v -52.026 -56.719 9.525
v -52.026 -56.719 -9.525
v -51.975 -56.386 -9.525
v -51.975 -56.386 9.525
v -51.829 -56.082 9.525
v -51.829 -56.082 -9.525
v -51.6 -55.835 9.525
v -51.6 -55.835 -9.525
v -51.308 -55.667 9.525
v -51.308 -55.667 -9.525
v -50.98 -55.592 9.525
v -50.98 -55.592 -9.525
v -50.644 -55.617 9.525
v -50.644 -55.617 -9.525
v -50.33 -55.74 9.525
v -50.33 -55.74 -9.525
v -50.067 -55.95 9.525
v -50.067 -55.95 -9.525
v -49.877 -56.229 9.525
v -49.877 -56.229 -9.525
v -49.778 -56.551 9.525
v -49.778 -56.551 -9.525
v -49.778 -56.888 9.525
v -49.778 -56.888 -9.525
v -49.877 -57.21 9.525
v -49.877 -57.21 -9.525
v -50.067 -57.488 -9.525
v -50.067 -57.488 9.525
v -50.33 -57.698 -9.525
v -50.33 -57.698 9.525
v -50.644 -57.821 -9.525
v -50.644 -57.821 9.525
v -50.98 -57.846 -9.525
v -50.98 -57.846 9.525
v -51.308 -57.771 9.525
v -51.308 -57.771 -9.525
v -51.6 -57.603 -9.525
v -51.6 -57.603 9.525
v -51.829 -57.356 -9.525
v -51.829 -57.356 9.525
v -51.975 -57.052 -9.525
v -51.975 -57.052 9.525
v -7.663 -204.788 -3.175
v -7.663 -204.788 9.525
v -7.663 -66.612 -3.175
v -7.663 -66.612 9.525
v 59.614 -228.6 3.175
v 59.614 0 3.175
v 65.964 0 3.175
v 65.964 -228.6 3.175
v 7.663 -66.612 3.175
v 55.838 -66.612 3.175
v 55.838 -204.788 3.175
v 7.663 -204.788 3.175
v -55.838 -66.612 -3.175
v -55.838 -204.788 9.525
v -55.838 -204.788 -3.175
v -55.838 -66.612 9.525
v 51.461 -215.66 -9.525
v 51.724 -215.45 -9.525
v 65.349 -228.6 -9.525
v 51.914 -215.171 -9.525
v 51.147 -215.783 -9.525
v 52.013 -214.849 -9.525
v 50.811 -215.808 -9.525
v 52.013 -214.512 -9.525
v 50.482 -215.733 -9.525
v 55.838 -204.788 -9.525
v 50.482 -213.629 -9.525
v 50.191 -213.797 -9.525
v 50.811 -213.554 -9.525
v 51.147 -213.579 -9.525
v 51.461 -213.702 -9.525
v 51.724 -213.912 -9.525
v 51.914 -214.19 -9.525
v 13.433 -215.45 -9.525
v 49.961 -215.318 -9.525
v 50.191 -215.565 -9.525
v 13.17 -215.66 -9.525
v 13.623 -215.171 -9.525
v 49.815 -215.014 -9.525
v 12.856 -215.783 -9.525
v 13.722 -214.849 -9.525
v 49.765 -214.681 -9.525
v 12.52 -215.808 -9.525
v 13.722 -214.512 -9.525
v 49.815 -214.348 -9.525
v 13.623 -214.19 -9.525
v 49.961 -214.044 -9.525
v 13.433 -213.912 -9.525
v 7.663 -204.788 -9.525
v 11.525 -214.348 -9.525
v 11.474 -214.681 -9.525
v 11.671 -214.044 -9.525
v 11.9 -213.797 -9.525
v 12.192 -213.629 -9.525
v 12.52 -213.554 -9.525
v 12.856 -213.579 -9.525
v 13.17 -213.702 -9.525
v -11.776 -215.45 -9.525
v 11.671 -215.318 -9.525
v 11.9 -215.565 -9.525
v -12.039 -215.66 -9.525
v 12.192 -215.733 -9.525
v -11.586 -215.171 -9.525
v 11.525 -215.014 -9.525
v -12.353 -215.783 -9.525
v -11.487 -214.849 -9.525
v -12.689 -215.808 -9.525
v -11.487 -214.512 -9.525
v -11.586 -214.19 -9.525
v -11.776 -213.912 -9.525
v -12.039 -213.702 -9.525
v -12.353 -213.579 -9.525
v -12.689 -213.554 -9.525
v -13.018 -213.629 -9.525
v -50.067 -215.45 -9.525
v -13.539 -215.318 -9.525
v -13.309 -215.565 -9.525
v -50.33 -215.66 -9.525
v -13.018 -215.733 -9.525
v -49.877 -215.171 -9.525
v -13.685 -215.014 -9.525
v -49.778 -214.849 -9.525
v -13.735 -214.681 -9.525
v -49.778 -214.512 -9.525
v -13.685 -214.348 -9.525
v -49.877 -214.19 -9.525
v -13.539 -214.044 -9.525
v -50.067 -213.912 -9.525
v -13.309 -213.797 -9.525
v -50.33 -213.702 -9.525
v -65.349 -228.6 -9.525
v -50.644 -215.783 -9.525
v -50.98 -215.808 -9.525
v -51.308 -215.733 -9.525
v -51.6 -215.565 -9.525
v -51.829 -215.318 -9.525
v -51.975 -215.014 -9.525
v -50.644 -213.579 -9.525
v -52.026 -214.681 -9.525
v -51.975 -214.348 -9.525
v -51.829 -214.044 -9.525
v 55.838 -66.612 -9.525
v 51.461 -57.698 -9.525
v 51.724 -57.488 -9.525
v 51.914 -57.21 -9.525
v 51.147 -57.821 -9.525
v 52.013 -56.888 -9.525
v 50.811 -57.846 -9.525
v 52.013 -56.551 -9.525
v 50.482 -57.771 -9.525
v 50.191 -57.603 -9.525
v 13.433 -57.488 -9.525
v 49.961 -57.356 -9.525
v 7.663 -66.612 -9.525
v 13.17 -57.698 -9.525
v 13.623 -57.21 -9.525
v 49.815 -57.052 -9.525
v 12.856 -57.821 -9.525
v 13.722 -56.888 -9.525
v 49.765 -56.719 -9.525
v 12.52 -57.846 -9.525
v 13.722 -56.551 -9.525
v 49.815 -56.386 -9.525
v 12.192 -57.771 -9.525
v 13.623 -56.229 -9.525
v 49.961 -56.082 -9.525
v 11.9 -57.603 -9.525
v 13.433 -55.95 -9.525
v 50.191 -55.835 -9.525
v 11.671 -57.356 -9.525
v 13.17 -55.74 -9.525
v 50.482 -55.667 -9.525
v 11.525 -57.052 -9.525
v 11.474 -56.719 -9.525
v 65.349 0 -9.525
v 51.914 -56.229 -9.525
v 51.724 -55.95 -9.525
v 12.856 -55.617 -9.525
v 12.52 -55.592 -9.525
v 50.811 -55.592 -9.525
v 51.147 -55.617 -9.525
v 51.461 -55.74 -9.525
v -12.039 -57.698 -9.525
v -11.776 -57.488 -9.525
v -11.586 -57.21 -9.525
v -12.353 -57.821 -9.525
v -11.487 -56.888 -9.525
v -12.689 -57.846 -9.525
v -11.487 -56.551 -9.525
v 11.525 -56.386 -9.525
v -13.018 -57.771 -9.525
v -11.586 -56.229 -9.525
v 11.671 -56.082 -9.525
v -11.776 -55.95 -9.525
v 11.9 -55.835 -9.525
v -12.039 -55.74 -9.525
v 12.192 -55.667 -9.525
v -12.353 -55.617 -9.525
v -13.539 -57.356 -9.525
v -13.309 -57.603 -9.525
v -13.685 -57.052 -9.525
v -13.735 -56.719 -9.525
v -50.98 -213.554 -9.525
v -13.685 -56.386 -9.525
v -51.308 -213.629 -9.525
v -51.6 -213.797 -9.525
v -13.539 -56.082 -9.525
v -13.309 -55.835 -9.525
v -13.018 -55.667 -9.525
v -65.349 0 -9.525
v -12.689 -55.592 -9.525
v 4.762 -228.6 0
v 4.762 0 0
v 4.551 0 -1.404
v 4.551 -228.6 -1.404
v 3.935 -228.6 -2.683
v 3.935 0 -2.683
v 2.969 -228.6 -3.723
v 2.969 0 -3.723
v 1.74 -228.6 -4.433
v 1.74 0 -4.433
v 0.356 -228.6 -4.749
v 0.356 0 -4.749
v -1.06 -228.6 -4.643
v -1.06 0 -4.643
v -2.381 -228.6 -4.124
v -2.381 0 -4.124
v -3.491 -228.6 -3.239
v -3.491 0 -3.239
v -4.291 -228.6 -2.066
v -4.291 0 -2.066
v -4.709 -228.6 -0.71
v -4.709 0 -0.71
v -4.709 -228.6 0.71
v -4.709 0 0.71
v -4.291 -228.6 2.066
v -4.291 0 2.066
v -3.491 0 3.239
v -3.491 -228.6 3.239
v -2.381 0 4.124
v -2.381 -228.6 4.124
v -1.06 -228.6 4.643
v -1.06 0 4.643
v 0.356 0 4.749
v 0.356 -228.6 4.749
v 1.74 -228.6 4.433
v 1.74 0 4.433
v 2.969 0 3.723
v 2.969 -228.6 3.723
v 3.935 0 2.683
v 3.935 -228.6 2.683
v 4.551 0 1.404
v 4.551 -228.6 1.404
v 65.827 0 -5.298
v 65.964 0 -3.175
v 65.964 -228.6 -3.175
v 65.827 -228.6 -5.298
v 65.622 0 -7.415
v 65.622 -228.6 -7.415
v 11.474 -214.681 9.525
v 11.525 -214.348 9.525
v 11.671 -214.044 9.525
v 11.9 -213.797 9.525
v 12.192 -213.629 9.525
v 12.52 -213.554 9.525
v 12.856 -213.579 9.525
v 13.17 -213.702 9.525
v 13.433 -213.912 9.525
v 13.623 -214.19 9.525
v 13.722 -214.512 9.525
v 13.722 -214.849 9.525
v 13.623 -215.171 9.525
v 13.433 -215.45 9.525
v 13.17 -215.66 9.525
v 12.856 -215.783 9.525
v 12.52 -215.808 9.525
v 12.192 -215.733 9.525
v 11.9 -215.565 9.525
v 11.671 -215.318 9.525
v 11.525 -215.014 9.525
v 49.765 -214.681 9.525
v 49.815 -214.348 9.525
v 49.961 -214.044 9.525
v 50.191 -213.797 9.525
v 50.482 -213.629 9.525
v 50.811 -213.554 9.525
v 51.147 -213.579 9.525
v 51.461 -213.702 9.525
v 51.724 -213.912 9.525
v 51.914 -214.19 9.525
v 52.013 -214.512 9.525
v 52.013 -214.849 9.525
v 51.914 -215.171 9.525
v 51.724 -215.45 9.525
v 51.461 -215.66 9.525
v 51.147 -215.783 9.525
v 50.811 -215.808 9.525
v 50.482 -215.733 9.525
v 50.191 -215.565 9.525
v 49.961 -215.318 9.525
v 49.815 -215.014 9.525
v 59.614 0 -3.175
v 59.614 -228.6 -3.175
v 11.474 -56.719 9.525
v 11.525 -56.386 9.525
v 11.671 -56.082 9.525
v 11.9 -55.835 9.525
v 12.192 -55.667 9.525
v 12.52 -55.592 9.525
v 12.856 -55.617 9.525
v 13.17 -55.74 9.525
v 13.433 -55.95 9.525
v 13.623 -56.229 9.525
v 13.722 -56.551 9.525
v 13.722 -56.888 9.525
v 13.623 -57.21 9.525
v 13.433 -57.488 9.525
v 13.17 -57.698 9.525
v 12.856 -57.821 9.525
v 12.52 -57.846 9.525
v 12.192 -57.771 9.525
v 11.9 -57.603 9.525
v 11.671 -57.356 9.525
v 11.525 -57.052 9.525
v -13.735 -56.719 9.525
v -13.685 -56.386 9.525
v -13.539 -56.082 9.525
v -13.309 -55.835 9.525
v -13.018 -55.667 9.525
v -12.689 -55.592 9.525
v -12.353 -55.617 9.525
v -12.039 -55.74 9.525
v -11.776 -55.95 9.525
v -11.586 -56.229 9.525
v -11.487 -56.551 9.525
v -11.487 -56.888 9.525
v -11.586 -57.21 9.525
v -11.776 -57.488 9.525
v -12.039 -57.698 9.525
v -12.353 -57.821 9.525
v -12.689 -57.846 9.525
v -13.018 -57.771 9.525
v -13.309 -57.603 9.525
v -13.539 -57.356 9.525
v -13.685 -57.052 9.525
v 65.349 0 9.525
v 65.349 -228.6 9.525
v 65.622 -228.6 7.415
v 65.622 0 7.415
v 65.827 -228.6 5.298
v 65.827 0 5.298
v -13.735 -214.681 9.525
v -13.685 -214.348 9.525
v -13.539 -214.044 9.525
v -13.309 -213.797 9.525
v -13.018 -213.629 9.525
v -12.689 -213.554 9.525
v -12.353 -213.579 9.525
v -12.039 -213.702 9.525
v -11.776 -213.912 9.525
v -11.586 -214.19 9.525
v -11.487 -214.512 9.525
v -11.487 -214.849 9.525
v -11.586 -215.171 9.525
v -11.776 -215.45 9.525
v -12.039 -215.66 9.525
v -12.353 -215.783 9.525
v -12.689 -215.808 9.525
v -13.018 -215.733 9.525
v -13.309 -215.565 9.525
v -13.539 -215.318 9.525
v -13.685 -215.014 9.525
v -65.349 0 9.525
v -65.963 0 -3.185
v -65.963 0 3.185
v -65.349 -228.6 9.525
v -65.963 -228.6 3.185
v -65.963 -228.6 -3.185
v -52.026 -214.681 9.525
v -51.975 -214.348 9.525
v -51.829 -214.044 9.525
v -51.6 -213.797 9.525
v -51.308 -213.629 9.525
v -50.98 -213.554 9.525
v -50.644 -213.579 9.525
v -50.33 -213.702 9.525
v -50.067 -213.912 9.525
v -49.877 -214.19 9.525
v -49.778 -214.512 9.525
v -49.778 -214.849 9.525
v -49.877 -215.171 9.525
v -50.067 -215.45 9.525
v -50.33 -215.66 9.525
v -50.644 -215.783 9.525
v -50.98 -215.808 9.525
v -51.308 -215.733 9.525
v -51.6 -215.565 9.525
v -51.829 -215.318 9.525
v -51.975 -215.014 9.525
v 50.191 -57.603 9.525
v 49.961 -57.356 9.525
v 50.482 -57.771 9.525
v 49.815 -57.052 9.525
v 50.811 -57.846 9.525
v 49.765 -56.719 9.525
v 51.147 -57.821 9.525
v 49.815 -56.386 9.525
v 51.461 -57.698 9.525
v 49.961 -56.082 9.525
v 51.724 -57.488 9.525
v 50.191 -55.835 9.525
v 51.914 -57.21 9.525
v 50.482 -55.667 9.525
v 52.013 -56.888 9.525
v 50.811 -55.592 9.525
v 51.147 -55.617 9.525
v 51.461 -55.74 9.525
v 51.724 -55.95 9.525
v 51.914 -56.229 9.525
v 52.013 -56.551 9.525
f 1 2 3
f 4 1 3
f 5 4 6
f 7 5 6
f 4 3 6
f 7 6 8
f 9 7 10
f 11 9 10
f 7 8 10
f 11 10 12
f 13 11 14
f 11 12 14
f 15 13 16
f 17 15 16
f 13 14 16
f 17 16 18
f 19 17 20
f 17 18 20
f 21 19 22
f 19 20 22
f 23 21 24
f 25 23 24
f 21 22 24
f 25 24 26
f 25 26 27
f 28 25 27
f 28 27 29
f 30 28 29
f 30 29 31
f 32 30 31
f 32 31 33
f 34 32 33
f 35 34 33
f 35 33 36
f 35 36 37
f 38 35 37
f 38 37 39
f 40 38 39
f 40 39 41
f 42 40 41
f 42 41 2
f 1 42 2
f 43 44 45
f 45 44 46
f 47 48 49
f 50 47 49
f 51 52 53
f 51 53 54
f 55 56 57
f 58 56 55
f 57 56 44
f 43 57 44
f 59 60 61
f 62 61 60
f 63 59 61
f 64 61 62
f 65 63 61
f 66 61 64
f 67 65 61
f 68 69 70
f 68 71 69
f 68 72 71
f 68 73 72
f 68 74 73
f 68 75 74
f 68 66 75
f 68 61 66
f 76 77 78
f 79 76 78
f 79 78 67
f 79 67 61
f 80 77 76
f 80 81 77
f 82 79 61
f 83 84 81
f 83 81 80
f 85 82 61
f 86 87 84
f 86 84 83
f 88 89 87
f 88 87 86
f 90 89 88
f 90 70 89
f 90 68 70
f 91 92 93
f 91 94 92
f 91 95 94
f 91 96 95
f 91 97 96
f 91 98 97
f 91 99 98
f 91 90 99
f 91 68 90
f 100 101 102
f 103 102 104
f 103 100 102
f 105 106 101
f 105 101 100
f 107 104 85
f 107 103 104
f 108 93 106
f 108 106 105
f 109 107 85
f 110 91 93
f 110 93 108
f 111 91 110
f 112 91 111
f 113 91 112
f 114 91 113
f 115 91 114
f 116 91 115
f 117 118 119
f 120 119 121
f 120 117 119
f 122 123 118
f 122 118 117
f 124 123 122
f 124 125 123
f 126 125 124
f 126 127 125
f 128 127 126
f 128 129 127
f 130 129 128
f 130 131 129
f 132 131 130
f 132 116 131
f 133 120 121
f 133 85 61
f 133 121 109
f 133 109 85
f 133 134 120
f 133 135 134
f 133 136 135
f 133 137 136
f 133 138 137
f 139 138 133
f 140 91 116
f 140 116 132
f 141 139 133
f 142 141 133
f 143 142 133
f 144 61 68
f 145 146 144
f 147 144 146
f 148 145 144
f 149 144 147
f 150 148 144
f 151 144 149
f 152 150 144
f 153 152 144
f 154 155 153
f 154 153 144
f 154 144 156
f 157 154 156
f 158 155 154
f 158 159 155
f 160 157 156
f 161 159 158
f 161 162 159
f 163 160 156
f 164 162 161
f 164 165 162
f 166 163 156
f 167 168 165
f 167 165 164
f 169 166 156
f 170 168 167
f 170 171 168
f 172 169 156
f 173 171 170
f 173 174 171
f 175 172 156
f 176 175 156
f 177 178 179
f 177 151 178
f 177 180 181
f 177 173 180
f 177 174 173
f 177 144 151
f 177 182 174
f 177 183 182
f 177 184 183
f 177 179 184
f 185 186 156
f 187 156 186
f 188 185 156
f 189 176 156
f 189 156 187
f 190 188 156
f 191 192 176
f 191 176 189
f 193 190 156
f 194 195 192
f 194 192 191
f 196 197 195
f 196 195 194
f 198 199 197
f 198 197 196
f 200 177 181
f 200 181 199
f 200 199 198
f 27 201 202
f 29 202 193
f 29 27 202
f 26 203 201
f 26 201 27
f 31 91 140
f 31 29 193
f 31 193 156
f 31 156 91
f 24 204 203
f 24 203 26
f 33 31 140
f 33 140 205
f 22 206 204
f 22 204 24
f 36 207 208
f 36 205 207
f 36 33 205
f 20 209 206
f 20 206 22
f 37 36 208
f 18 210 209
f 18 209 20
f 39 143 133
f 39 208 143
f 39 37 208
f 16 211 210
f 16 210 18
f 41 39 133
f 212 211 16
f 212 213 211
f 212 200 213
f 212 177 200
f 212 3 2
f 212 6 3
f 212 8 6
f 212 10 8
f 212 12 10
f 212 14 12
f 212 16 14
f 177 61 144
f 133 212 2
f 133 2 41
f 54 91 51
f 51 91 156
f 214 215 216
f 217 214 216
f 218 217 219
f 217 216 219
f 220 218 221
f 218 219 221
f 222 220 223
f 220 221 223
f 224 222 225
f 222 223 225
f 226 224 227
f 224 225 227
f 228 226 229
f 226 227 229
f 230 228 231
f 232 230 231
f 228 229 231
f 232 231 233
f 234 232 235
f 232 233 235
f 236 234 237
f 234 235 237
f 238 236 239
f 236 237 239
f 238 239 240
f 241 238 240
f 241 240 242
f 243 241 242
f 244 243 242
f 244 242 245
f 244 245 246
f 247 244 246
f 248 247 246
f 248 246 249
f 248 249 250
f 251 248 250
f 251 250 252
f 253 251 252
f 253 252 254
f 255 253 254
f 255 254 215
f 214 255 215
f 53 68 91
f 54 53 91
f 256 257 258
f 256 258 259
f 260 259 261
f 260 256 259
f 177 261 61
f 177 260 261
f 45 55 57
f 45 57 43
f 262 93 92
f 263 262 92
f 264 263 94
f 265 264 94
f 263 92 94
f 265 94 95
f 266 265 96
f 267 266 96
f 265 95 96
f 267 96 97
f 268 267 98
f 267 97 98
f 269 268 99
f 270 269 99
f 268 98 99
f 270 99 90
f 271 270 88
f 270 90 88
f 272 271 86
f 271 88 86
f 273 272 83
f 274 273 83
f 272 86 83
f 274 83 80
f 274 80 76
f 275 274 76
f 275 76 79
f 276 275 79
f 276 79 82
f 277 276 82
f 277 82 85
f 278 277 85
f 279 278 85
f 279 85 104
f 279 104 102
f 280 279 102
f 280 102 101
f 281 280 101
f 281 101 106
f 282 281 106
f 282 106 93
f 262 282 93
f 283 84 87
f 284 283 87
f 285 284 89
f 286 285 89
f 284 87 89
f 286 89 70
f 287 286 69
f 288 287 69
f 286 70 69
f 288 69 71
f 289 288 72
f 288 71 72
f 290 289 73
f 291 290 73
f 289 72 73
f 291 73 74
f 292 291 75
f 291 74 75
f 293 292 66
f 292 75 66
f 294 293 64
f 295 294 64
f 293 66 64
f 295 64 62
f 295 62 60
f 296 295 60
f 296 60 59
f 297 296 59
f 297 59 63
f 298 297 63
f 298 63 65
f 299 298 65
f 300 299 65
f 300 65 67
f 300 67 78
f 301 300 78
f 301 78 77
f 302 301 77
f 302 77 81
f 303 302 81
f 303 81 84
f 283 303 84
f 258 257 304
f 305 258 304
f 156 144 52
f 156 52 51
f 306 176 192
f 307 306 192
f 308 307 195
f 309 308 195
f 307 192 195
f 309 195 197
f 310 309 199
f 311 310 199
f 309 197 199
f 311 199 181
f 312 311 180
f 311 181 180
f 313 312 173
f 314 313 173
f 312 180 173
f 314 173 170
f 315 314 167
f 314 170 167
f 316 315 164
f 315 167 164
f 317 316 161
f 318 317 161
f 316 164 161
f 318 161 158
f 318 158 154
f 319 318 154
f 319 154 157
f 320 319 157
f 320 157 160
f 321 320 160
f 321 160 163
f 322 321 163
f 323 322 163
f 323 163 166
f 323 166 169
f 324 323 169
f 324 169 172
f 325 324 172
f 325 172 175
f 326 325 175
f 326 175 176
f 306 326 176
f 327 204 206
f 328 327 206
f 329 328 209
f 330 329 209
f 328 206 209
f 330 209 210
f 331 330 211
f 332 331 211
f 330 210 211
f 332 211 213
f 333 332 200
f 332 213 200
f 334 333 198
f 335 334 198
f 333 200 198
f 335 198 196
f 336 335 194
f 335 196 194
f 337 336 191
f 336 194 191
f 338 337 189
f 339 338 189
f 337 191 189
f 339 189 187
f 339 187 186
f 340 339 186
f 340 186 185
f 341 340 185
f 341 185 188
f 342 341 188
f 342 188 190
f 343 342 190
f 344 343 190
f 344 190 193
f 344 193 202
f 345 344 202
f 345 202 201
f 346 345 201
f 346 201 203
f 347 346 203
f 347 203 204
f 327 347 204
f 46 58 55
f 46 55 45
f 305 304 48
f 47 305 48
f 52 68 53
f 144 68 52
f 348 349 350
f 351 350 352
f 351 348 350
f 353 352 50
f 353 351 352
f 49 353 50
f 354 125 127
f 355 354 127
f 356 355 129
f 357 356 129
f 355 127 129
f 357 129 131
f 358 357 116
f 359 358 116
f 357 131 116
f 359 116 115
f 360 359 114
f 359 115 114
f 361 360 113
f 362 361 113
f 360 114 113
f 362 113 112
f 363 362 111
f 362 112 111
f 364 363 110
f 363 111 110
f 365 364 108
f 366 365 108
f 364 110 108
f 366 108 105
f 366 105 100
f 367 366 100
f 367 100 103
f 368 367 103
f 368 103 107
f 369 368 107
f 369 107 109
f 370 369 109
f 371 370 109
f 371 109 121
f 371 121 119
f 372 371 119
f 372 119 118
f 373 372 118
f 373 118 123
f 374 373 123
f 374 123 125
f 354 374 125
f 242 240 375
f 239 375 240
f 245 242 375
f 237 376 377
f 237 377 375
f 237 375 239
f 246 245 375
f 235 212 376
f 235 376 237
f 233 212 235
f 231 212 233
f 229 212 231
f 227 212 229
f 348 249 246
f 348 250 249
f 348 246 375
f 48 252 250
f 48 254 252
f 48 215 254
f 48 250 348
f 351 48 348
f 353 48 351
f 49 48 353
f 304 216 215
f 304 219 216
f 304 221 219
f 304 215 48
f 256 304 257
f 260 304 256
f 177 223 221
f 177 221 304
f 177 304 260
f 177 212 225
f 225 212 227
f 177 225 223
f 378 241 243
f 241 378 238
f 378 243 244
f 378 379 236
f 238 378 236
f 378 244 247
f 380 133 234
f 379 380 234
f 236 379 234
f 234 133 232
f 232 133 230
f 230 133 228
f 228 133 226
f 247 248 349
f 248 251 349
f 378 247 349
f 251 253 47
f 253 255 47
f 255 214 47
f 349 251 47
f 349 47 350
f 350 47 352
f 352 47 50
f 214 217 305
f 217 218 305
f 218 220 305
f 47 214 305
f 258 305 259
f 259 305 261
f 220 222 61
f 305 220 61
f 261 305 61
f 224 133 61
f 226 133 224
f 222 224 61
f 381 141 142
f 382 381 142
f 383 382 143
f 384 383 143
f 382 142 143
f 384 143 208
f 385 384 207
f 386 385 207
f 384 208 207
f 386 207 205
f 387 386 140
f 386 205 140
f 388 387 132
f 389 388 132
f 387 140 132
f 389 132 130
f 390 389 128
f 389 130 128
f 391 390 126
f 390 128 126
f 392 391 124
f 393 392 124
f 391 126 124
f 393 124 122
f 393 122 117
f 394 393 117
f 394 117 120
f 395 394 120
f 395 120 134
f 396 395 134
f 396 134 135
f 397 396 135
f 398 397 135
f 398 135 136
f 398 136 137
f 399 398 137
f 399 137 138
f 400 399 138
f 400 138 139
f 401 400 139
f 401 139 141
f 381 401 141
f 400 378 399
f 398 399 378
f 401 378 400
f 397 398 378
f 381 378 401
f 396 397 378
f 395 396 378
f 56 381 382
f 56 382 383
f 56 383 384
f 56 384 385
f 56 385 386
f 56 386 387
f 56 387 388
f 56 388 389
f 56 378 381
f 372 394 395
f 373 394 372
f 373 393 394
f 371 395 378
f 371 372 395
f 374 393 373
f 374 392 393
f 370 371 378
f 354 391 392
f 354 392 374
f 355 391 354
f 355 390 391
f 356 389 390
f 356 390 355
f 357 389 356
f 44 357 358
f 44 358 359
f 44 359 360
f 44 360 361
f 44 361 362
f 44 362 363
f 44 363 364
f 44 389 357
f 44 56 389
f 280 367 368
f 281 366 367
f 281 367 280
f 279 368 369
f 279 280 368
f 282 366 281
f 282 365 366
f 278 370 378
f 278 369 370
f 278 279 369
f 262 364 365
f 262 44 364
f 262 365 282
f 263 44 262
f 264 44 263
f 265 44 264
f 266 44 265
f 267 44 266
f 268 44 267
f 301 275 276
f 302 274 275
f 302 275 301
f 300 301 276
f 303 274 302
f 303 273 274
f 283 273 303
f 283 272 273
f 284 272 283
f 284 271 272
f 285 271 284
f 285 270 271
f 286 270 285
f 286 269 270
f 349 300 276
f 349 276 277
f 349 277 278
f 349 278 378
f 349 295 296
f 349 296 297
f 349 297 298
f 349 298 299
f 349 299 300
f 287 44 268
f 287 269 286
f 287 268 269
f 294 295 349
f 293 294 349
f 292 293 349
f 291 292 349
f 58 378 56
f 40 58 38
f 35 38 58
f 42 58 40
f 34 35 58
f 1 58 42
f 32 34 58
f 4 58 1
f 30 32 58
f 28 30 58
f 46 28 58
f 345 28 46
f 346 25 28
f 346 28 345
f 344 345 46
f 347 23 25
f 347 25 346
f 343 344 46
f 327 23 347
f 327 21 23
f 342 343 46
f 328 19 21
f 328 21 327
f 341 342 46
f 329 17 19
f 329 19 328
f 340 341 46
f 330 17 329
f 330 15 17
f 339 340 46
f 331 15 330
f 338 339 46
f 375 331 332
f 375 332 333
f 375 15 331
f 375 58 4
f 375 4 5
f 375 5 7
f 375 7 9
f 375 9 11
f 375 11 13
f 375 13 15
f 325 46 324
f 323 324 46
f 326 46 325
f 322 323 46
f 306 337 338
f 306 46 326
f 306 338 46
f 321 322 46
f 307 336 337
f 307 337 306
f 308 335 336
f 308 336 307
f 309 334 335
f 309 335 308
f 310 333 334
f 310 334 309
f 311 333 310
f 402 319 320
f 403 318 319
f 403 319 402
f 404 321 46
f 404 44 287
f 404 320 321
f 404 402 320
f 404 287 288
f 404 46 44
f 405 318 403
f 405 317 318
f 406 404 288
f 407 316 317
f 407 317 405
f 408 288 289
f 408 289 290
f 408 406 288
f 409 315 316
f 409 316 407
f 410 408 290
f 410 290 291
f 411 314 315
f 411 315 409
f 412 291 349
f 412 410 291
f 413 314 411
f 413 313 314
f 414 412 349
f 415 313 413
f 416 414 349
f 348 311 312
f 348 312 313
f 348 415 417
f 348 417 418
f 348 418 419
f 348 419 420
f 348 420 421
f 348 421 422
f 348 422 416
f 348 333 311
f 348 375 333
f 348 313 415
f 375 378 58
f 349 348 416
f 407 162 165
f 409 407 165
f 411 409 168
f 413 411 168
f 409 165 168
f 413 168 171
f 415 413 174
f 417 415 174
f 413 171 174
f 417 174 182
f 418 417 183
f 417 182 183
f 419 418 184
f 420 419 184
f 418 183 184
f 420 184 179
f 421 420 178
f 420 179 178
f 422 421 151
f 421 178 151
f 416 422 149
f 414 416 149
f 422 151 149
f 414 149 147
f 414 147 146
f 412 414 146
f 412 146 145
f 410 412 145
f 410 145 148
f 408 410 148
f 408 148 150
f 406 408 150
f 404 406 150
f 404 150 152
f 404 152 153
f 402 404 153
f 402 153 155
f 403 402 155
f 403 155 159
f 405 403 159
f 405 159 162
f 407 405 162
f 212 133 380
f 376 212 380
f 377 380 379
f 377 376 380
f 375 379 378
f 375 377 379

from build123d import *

# Parameters (mm, degrees)
BOSS_EXTRUDE1_DEPTH   = 228.6
SKETCH3_R             = 4.7625
CUT_EXTRUDE1_DEPTH    = 229.6
F_4_40_TAPPED_HOLE1_D = 2.2606
CUT_EXTRUDE2_DEPTH    = 229.6
SKETCH7_W             = 48.175
SKETCH7_H             = 138.175
CUT_EXTRUDE3_DEPTH    = 12.7
SKETCH8_W             = 48.175
SKETCH8_H             = 138.175
CUT_EXTRUDE4_DEPTH    = 12.7


with BuildPart() as part:
    # Sketch1 → Boss-Extrude1 (new body)
    with BuildSketch(Plane(origin=(0, 0, 0), x_dir=(1, 0, 0), z_dir=(0, 1, 0))):
        with BuildLine():
            Line((-65.349491008, -9.525), (65.349491008, -9.525))
            ThreePointArc((65.349491008, -9.525), (66.04, 0), (65.349491008, 9.525))
            Line((65.349491008, 9.525), (-65.349491008, 9.525))
            ThreePointArc((-65.349491008, 9.525), (-66.04, 0), (-65.349491008, -9.525))
        make_face()
    extrude(amount=-BOSS_EXTRUDE1_DEPTH)

    # Sketch3 → Cut-Extrude1 (cut, through all)
    with BuildSketch(Plane(origin=(0, 0, 0), x_dir=(1, 0, 0), z_dir=(0, 1, 0))):
        Circle(SKETCH3_R)
    extrude(amount=-CUT_EXTRUDE1_DEPTH, mode=Mode.SUBTRACT)

    # #4-40 Tapped Hole1 (through all)
    with Locations(Plane.XY.offset(9.525)):
        with Locations((-50.895394878, -56.7192), (-12.604605122, -56.7192), (-12.604605122, -214.6808), (-50.895394878, -214.6808), (12.604605122, -56.7192), (50.895394878, -56.7192), (12.604605122, -214.6808), (50.895394878, -214.6808)):
            Hole(F_4_40_TAPPED_HOLE1_D / 2)

    # Sketch6 → Cut-Extrude2 (cut, through all)
    with BuildSketch(Plane.XZ.offset(228.6)):
        with BuildLine():
            Line((59.613633731, 3.175), (65.963633731, 3.175))
            ThreePointArc((65.963633731, 3.175), (66.04, 0), (65.963633731, -3.175))
            Line((65.963633731, -3.175), (59.613633731, -3.175))
            Line((59.613633731, -3.175), (59.613633731, 3.175))
        make_face()
    extrude(amount=-CUT_EXTRUDE2_DEPTH, mode=Mode.SUBTRACT)

    # Sketch7 → Cut-Extrude3 (cut)
    with BuildSketch(Plane.XY.offset(9.525)):
        with Locations((-31.75, -135.7)):
            Rectangle(SKETCH7_W, SKETCH7_H)
    extrude(amount=-CUT_EXTRUDE3_DEPTH, mode=Mode.SUBTRACT)

    # Sketch8 → Cut-Extrude4 (cut)
    with BuildSketch(Plane(origin=(0, 0, -9.525), x_dir=(-1, 0, 0), z_dir=(0, 0, -1))):
        with Locations((-31.75, -135.7)):
            Rectangle(SKETCH8_W, SKETCH8_H)
    extrude(amount=-CUT_EXTRUDE4_DEPTH, mode=Mode.SUBTRACT)


solid = part.part
